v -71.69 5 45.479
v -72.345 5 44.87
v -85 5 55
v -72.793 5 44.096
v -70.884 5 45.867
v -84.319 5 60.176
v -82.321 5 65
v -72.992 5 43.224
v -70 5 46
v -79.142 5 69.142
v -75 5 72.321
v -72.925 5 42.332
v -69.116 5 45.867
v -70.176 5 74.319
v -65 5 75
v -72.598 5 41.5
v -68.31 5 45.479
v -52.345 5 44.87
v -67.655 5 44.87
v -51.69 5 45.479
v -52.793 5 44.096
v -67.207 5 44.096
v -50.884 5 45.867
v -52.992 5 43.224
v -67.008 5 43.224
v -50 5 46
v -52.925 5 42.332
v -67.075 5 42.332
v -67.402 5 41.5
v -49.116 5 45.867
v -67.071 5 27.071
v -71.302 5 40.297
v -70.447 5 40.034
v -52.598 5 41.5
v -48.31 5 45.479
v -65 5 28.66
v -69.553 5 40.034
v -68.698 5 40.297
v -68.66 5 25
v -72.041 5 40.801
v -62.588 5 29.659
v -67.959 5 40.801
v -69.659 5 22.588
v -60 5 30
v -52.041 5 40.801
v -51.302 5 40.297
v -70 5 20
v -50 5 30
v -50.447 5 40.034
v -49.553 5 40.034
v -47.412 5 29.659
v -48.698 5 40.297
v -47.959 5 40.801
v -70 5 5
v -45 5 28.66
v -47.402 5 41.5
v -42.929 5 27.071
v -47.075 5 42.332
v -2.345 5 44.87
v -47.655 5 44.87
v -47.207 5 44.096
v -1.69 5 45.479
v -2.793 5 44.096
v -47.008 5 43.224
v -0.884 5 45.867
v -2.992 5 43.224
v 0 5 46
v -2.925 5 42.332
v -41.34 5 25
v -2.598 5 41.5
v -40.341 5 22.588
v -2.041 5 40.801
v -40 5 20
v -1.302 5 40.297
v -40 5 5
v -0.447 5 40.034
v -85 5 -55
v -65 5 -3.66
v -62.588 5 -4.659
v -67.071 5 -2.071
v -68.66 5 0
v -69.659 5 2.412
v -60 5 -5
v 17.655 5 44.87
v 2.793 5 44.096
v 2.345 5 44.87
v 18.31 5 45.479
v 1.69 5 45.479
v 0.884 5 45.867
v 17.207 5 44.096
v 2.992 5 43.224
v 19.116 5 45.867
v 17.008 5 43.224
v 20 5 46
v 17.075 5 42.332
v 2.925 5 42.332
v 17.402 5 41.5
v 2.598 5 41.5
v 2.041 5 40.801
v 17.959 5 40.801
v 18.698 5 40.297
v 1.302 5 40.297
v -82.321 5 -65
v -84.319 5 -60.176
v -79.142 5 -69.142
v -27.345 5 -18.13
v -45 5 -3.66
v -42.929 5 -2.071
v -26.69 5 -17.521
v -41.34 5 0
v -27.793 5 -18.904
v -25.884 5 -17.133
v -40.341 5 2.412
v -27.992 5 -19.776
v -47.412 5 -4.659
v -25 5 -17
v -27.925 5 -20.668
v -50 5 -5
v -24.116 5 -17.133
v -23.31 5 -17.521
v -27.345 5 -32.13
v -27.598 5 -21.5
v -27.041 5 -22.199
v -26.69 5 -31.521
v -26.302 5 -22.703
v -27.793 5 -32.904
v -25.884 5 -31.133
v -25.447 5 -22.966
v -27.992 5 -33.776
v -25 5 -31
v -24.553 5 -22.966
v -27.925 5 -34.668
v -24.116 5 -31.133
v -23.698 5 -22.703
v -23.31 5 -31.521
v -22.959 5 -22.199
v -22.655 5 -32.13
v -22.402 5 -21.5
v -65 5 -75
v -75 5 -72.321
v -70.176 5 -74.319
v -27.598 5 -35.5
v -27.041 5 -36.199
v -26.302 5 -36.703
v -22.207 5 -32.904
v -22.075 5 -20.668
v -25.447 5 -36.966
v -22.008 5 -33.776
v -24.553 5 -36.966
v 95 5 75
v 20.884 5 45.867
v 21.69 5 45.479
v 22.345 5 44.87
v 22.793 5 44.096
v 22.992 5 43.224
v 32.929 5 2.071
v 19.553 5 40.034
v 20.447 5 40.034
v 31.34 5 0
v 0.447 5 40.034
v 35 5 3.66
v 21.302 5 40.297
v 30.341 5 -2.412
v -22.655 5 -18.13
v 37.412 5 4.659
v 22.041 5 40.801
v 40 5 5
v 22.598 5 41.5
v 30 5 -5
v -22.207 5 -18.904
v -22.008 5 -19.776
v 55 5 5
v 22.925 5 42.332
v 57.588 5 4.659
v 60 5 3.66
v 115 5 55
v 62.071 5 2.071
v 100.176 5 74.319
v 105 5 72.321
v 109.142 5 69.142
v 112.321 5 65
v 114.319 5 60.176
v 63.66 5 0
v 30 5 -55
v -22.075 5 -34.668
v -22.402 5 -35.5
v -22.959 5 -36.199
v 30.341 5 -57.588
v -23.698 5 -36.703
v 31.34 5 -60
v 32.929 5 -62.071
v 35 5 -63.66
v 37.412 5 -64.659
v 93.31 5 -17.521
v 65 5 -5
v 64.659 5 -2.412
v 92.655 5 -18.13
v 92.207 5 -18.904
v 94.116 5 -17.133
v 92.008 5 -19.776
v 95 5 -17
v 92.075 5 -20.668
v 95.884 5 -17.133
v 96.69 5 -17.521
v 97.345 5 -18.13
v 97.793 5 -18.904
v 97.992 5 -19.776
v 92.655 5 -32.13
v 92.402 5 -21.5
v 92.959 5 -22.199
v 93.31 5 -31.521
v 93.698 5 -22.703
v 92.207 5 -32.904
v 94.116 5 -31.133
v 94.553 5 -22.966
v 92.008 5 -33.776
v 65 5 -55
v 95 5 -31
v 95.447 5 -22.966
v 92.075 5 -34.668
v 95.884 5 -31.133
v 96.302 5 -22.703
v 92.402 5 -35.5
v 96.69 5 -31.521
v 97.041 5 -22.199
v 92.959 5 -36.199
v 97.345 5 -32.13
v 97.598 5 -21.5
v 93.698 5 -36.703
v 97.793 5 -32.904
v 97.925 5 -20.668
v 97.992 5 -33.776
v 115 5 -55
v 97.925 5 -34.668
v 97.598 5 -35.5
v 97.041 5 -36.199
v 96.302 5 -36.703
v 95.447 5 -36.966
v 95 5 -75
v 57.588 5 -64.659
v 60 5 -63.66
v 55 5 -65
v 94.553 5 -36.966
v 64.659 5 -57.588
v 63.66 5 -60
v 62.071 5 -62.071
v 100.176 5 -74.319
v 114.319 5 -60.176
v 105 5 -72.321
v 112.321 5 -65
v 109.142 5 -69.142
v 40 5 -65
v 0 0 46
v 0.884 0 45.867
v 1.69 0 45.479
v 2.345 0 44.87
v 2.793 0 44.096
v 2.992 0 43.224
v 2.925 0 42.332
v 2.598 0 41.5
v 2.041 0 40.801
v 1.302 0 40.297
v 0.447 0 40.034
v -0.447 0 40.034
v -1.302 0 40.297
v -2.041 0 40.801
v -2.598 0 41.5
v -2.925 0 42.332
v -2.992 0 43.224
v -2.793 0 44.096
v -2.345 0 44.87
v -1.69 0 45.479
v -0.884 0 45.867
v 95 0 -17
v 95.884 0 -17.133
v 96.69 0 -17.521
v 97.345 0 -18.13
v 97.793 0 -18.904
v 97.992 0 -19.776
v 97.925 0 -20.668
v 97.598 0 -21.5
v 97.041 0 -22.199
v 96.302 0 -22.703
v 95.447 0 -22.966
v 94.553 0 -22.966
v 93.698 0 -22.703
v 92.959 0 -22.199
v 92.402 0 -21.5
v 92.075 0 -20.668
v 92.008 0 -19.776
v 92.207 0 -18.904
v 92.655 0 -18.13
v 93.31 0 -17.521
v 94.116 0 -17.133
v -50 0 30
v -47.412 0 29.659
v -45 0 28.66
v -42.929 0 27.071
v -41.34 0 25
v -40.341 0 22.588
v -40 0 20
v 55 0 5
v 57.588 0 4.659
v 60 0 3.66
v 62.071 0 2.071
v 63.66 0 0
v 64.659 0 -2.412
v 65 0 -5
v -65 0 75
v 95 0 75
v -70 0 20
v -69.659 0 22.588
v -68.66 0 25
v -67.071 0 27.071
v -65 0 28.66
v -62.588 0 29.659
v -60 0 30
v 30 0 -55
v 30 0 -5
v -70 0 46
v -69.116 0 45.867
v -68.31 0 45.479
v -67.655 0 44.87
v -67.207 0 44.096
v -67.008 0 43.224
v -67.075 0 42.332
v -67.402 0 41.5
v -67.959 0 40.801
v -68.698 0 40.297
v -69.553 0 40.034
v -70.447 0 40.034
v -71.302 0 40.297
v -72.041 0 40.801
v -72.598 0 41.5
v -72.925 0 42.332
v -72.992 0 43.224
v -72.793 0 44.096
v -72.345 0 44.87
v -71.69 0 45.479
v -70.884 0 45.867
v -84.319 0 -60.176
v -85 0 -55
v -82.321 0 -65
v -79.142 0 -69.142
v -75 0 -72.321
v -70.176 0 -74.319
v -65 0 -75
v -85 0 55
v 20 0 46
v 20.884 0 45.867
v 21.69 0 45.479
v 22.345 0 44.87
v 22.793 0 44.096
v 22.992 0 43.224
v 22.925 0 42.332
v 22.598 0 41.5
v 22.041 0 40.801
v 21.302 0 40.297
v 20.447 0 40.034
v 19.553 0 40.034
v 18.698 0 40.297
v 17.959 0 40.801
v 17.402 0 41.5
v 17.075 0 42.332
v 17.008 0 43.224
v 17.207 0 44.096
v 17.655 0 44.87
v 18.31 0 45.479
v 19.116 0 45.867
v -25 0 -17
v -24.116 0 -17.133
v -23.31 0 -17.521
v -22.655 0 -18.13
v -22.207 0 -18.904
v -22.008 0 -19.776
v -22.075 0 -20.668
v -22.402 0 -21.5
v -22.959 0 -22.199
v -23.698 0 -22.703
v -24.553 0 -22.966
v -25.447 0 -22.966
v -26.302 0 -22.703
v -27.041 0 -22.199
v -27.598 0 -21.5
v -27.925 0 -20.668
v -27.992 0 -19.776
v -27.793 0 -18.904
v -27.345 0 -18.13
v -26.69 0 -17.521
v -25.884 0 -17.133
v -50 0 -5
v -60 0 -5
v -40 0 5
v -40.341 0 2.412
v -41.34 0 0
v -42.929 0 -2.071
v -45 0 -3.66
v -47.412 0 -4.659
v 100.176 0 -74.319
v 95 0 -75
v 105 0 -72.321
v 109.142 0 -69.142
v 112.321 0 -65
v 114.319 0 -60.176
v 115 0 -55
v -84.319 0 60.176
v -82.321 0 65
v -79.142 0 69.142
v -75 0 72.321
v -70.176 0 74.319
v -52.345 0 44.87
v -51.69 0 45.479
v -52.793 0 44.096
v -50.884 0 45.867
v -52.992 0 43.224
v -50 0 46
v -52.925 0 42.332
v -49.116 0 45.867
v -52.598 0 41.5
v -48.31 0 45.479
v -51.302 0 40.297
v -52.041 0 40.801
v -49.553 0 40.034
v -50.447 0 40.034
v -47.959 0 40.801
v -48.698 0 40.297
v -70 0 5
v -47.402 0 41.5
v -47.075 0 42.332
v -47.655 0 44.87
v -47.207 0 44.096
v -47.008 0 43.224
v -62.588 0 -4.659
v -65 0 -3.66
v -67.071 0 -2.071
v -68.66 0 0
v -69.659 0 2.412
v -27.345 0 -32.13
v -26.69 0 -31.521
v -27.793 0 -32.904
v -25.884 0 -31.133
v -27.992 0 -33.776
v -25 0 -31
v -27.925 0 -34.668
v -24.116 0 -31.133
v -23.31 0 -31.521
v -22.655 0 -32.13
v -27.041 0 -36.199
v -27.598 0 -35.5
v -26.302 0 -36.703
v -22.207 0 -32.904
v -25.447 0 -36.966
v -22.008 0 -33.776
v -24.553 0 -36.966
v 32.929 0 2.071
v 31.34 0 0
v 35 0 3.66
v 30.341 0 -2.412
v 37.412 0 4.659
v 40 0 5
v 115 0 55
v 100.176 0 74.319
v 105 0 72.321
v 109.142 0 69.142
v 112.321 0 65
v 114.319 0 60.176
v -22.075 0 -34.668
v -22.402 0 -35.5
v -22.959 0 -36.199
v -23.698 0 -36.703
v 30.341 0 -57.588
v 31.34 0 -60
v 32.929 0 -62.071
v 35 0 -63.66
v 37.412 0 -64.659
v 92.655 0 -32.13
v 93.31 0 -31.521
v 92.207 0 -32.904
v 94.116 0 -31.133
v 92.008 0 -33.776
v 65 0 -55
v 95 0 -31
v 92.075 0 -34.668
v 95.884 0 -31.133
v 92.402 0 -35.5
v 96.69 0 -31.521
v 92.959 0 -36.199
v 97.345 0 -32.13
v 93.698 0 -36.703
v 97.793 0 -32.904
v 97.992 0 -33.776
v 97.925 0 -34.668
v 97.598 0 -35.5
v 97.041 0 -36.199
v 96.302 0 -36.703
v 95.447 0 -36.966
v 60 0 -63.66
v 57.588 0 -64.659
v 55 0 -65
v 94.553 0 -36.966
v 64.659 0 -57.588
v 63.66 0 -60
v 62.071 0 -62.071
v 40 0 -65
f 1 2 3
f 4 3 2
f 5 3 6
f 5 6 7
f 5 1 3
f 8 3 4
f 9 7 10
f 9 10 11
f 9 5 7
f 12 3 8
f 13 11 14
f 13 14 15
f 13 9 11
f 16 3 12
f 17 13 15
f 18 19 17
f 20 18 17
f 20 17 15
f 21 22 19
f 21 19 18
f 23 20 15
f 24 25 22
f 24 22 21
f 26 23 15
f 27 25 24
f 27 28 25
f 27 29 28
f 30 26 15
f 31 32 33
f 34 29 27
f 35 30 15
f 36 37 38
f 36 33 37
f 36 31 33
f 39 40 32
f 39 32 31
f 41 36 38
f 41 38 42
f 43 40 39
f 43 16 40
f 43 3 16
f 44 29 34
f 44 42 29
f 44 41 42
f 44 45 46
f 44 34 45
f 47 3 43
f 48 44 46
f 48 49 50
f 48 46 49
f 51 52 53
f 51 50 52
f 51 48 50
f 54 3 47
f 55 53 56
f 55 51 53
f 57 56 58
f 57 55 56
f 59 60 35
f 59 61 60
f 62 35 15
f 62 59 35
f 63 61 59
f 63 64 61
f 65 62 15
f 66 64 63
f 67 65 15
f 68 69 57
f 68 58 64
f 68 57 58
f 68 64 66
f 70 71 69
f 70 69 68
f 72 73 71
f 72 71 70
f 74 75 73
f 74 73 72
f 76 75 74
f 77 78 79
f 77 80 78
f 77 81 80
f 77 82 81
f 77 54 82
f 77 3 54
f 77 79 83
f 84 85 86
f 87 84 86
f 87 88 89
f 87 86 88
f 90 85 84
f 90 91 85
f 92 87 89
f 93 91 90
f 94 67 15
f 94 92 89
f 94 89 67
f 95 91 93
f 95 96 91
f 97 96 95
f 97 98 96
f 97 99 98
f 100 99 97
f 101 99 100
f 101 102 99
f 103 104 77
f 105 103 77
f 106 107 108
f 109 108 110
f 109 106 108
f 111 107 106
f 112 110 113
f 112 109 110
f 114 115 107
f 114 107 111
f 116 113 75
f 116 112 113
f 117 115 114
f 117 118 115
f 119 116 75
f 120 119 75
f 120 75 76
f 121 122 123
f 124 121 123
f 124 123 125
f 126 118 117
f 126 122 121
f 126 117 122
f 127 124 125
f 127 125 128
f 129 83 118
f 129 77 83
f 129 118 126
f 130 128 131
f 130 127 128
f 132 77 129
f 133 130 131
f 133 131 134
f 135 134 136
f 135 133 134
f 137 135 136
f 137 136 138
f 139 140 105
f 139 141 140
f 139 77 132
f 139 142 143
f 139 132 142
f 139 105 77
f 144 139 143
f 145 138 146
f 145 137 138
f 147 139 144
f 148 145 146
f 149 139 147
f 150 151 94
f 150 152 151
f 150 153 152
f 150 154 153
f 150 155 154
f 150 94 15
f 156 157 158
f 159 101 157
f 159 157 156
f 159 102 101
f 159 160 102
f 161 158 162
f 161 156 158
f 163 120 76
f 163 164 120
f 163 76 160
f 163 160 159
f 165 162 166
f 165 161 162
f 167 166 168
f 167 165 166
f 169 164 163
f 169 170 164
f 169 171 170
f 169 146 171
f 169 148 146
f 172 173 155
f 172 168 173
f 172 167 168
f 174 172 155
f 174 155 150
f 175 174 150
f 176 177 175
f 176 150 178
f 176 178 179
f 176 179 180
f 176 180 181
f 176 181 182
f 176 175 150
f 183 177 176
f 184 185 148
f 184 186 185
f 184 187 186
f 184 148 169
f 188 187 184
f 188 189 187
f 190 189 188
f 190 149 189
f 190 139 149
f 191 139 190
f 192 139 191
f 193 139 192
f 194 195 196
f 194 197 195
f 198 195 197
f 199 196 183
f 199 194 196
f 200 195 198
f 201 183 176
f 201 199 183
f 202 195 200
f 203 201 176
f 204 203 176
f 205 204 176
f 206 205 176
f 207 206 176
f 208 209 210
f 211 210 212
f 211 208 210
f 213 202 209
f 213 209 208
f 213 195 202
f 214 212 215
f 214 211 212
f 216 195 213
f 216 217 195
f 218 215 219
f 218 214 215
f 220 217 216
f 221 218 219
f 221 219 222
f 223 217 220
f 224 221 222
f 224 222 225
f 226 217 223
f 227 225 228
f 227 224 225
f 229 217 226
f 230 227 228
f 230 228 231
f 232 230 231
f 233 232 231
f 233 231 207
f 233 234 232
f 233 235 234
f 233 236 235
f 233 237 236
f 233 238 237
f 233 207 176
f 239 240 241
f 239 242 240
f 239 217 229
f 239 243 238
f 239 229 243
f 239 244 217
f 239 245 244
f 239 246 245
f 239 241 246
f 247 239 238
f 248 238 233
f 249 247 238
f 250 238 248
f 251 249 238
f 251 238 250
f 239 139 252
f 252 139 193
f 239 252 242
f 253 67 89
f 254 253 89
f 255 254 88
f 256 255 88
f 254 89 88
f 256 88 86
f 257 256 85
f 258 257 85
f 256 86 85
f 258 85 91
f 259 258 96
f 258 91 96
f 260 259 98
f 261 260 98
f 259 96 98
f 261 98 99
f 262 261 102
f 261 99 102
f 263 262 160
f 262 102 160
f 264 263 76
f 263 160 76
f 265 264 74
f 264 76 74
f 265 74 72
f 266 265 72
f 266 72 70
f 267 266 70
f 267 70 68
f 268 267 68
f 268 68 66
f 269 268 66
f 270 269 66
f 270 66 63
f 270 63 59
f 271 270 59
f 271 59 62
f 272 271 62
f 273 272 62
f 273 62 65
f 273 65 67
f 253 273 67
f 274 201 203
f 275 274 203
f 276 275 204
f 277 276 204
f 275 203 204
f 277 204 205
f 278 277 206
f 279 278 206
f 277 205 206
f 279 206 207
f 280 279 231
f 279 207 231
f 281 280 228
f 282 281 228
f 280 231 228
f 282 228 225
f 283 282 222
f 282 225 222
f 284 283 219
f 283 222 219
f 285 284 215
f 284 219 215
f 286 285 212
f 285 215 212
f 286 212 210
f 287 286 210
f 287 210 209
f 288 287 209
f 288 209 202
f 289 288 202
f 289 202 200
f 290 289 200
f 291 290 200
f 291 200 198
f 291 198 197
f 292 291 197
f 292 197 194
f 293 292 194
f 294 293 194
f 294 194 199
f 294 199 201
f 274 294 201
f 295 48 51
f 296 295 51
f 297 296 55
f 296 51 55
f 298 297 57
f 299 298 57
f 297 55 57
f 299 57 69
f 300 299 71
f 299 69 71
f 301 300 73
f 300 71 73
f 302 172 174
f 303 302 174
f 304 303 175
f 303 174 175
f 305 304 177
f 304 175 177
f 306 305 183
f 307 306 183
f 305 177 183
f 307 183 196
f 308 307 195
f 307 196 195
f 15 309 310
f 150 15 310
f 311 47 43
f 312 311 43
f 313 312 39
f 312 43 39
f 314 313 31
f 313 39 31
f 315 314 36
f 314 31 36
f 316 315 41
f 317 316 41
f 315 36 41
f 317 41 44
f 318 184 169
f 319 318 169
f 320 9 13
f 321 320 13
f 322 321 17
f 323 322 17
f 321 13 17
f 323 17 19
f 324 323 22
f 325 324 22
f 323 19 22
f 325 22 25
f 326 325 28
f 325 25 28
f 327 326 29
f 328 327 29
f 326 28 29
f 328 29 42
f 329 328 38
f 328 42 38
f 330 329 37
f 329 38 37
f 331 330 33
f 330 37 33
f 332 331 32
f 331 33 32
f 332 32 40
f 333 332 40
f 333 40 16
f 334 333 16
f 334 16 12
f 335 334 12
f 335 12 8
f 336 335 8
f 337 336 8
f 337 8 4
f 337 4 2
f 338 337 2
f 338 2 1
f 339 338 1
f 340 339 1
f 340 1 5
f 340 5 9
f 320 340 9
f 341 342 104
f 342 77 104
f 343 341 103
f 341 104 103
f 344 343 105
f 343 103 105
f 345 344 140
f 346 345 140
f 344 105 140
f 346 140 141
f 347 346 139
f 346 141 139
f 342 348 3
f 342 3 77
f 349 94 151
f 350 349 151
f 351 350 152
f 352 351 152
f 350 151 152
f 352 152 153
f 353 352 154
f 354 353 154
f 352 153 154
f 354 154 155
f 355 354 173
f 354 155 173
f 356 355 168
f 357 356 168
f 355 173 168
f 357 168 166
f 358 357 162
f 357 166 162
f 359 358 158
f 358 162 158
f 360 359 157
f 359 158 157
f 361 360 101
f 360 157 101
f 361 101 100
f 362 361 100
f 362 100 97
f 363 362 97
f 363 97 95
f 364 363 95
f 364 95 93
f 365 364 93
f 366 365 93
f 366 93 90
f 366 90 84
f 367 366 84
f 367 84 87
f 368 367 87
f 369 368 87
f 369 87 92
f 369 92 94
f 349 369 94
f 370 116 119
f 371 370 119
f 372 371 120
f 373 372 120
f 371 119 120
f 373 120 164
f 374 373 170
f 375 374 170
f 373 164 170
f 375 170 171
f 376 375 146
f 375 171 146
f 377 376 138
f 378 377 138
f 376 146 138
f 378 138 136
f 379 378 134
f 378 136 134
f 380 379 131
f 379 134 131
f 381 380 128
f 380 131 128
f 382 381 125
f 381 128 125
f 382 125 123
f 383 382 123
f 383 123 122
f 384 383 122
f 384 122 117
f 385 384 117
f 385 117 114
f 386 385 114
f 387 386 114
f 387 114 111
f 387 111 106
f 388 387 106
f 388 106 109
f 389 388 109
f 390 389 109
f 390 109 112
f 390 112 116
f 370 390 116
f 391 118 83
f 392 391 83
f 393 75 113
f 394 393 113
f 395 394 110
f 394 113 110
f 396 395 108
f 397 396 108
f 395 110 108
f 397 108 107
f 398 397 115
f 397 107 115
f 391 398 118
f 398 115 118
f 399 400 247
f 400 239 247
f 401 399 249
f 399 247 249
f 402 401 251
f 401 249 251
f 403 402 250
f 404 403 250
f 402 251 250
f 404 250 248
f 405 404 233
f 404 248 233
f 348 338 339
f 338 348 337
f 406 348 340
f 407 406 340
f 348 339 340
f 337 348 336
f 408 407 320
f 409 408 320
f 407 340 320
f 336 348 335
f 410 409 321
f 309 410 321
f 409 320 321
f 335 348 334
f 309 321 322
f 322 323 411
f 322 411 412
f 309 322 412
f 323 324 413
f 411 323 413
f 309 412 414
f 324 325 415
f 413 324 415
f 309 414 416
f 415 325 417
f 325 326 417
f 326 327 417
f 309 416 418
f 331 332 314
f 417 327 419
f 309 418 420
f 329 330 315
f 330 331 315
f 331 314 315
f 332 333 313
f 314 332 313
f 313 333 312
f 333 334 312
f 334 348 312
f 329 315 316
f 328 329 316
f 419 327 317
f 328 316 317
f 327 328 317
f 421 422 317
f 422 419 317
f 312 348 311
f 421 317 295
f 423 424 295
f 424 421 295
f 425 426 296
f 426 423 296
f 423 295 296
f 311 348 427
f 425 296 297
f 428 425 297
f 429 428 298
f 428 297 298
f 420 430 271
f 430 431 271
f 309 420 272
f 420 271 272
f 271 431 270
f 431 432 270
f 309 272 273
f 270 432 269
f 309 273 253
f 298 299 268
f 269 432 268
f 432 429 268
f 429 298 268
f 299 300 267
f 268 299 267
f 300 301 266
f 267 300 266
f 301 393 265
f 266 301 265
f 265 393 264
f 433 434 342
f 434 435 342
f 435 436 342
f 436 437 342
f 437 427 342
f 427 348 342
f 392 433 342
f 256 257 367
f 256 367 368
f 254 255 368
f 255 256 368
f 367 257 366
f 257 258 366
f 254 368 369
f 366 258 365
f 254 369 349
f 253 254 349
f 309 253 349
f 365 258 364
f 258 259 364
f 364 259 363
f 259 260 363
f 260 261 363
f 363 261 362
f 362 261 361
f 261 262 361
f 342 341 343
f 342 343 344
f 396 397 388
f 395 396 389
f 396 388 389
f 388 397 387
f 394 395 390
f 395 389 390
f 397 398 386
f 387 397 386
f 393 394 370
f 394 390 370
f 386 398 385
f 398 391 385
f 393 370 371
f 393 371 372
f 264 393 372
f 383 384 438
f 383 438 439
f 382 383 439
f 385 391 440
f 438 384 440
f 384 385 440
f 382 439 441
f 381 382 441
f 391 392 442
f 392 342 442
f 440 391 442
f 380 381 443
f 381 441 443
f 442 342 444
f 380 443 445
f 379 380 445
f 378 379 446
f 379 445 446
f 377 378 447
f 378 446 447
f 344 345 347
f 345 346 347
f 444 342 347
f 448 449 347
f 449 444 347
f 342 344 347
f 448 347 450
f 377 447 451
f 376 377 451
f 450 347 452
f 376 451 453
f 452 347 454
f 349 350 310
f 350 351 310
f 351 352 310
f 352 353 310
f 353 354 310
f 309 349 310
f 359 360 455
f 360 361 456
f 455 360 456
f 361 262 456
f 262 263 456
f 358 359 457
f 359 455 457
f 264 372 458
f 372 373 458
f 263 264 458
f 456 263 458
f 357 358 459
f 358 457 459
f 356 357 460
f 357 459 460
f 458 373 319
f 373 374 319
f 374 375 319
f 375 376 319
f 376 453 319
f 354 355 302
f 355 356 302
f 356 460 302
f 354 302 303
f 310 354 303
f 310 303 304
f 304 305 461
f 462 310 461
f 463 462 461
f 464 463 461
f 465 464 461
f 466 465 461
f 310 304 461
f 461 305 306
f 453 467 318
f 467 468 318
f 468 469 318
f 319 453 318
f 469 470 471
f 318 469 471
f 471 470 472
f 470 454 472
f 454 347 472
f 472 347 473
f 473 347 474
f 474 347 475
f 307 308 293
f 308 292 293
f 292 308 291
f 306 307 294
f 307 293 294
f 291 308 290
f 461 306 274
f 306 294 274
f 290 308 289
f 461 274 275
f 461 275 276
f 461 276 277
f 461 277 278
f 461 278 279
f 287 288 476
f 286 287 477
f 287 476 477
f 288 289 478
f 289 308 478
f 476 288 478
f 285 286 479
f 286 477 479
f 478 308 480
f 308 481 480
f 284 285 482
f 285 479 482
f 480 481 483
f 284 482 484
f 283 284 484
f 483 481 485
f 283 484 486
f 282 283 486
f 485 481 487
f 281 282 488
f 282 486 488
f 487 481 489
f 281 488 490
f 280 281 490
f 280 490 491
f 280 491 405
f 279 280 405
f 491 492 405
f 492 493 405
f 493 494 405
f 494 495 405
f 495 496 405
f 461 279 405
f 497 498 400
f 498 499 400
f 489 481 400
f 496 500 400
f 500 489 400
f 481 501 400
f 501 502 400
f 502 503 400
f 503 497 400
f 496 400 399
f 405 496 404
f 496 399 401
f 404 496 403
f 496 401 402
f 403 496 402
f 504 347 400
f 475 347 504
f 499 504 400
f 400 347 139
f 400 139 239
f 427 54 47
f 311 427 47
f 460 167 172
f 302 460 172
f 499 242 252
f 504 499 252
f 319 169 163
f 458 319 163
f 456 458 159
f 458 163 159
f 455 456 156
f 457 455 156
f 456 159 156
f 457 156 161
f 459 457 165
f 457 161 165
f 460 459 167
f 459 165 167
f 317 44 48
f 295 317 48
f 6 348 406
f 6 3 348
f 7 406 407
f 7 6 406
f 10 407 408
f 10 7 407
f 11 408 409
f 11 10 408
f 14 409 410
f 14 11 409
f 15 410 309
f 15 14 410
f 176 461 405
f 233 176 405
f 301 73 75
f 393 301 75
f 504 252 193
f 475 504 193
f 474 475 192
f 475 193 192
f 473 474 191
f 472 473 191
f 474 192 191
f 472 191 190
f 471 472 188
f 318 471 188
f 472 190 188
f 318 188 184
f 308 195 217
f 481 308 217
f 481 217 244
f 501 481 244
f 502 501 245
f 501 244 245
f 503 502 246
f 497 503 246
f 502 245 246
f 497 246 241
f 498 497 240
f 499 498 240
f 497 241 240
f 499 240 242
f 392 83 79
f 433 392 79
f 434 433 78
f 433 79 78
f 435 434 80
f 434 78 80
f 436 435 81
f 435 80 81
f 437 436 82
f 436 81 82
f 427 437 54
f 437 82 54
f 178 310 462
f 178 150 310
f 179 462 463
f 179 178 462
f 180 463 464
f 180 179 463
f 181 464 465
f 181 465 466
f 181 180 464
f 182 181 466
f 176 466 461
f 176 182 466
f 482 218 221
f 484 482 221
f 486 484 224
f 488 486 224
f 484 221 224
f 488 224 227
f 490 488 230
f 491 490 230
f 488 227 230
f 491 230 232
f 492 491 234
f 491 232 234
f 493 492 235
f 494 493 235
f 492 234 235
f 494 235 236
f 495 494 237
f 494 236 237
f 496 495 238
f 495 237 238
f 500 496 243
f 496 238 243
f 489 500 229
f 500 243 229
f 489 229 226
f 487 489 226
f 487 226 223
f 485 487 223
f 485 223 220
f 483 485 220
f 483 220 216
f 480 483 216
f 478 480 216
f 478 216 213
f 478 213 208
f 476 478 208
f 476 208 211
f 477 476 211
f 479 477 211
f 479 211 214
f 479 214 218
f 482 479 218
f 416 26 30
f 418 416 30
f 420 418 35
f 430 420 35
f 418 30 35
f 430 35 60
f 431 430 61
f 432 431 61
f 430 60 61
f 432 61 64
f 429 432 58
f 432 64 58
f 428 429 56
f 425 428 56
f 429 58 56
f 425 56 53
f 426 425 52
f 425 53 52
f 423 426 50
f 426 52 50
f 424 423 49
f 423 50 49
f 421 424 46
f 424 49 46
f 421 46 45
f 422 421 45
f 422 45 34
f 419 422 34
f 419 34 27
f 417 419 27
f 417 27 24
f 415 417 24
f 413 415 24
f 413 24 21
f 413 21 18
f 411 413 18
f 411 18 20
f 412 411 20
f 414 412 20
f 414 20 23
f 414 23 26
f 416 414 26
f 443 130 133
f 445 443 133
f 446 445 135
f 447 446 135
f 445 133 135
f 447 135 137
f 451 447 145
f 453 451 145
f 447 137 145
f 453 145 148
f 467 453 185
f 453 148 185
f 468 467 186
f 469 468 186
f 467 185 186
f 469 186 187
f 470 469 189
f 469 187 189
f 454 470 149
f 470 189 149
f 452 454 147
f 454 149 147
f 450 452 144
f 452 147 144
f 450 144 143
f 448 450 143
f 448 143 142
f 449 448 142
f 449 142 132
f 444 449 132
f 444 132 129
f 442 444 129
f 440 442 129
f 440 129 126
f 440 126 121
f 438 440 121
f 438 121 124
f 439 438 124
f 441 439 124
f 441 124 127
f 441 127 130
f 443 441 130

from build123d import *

# Parameters (mm, degrees)
SKETCH1_W           = 200
SKETCH1_H           = 150
BOSS_EXTRUDE1_DEPTH = 5
SKETCH3_R           = 3
CUT_EXTRUDE2_DEPTH  = 10
FILLET1_R           = 20


with BuildPart() as part:
    # Sketch1 → Boss-Extrude1 (new body)
    with BuildSketch(Plane(origin=(0, 0, 0), x_dir=(1, 0, 0), z_dir=(0, 1, 0))):
        with Locations((15, 0)):
            Rectangle(SKETCH1_W, SKETCH1_H)
    extrude(amount=BOSS_EXTRUDE1_DEPTH)

    # Sketch3 → Cut-Extrude2 (cut)
    with BuildSketch(Plane(origin=(0, 5, 0), x_dir=(1, 0, 0), z_dir=(0, 1, 0))):
        with Locations(Location((-70, -43, 0), (0, 0, 270))):
            Circle(SKETCH3_R)
        with Locations(Location((-50, -43, 0), (0, 0, 270))):
            Circle(SKETCH3_R)
        with Locations(Location((0, -43, 0), (0, 0, 270))):
            Circle(SKETCH3_R)
        with Locations(Location((20, -43, 0), (0, 0, 270))):
            Circle(SKETCH3_R)
        with Locations(Location((-25, 20, 0), (0, 0, 270))):
            Circle(SKETCH3_R)
        with Locations(Location((-25, 34, 0), (0, 0, 270))):
            Circle(SKETCH3_R)
        with Locations(Location((95, 20, 0), (0, 0, 270))):
            Circle(SKETCH3_R)
        with Locations(Location((95, 34, 0), (0, 0, 270))):
            Circle(SKETCH3_R)
        with BuildLine():
            Line((40, -5), (55, -5))
            ThreePointArc((55, -5), (62.071067812, -2.071067812), (65, 5))
            Line((65, 5), (65, 55))
            ThreePointArc((65, 55), (62.071067812, 62.071067812), (55, 65))
            Line((55, 65), (40, 65))
            ThreePointArc((40, 65), (32.928932188, 62.071067812), (30, 55))
            Line((30, 55), (30, 5))
            ThreePointArc((30, 5), (32.928932188, -2.071067812), (40, -5))
        make_face()
        with BuildLine():
            Line((-60, -30), (-50, -30))
            ThreePointArc((-50, -30), (-42.928932188, -27.071067812), (-40, -20))
            Line((-40, -20), (-40, -5))
            ThreePointArc((-40, -5), (-42.928932188, 2.071067812), (-50, 5))
            Line((-50, 5), (-60, 5))
            ThreePointArc((-60, 5), (-67.071067812, 2.071067812), (-70, -5))
            Line((-70, -5), (-70, -20))
            ThreePointArc((-70, -20), (-67.071067812, -27.071067812), (-60, -30))
        make_face()
    extrude(amount=-CUT_EXTRUDE2_DEPTH, mode=Mode.SUBTRACT)

    # Fillet1
    fillet1_edges = [part.edges().sort_by_distance(p)[0] for p in [
        (-85, 2.5, -75),
        (115, 2.5, -75),
        (115, 2.5, 75),
        (-85, 2.5, 75),
    ]]
    fillet(fillet1_edges, radius=FILLET1_R)


solid = part.part
